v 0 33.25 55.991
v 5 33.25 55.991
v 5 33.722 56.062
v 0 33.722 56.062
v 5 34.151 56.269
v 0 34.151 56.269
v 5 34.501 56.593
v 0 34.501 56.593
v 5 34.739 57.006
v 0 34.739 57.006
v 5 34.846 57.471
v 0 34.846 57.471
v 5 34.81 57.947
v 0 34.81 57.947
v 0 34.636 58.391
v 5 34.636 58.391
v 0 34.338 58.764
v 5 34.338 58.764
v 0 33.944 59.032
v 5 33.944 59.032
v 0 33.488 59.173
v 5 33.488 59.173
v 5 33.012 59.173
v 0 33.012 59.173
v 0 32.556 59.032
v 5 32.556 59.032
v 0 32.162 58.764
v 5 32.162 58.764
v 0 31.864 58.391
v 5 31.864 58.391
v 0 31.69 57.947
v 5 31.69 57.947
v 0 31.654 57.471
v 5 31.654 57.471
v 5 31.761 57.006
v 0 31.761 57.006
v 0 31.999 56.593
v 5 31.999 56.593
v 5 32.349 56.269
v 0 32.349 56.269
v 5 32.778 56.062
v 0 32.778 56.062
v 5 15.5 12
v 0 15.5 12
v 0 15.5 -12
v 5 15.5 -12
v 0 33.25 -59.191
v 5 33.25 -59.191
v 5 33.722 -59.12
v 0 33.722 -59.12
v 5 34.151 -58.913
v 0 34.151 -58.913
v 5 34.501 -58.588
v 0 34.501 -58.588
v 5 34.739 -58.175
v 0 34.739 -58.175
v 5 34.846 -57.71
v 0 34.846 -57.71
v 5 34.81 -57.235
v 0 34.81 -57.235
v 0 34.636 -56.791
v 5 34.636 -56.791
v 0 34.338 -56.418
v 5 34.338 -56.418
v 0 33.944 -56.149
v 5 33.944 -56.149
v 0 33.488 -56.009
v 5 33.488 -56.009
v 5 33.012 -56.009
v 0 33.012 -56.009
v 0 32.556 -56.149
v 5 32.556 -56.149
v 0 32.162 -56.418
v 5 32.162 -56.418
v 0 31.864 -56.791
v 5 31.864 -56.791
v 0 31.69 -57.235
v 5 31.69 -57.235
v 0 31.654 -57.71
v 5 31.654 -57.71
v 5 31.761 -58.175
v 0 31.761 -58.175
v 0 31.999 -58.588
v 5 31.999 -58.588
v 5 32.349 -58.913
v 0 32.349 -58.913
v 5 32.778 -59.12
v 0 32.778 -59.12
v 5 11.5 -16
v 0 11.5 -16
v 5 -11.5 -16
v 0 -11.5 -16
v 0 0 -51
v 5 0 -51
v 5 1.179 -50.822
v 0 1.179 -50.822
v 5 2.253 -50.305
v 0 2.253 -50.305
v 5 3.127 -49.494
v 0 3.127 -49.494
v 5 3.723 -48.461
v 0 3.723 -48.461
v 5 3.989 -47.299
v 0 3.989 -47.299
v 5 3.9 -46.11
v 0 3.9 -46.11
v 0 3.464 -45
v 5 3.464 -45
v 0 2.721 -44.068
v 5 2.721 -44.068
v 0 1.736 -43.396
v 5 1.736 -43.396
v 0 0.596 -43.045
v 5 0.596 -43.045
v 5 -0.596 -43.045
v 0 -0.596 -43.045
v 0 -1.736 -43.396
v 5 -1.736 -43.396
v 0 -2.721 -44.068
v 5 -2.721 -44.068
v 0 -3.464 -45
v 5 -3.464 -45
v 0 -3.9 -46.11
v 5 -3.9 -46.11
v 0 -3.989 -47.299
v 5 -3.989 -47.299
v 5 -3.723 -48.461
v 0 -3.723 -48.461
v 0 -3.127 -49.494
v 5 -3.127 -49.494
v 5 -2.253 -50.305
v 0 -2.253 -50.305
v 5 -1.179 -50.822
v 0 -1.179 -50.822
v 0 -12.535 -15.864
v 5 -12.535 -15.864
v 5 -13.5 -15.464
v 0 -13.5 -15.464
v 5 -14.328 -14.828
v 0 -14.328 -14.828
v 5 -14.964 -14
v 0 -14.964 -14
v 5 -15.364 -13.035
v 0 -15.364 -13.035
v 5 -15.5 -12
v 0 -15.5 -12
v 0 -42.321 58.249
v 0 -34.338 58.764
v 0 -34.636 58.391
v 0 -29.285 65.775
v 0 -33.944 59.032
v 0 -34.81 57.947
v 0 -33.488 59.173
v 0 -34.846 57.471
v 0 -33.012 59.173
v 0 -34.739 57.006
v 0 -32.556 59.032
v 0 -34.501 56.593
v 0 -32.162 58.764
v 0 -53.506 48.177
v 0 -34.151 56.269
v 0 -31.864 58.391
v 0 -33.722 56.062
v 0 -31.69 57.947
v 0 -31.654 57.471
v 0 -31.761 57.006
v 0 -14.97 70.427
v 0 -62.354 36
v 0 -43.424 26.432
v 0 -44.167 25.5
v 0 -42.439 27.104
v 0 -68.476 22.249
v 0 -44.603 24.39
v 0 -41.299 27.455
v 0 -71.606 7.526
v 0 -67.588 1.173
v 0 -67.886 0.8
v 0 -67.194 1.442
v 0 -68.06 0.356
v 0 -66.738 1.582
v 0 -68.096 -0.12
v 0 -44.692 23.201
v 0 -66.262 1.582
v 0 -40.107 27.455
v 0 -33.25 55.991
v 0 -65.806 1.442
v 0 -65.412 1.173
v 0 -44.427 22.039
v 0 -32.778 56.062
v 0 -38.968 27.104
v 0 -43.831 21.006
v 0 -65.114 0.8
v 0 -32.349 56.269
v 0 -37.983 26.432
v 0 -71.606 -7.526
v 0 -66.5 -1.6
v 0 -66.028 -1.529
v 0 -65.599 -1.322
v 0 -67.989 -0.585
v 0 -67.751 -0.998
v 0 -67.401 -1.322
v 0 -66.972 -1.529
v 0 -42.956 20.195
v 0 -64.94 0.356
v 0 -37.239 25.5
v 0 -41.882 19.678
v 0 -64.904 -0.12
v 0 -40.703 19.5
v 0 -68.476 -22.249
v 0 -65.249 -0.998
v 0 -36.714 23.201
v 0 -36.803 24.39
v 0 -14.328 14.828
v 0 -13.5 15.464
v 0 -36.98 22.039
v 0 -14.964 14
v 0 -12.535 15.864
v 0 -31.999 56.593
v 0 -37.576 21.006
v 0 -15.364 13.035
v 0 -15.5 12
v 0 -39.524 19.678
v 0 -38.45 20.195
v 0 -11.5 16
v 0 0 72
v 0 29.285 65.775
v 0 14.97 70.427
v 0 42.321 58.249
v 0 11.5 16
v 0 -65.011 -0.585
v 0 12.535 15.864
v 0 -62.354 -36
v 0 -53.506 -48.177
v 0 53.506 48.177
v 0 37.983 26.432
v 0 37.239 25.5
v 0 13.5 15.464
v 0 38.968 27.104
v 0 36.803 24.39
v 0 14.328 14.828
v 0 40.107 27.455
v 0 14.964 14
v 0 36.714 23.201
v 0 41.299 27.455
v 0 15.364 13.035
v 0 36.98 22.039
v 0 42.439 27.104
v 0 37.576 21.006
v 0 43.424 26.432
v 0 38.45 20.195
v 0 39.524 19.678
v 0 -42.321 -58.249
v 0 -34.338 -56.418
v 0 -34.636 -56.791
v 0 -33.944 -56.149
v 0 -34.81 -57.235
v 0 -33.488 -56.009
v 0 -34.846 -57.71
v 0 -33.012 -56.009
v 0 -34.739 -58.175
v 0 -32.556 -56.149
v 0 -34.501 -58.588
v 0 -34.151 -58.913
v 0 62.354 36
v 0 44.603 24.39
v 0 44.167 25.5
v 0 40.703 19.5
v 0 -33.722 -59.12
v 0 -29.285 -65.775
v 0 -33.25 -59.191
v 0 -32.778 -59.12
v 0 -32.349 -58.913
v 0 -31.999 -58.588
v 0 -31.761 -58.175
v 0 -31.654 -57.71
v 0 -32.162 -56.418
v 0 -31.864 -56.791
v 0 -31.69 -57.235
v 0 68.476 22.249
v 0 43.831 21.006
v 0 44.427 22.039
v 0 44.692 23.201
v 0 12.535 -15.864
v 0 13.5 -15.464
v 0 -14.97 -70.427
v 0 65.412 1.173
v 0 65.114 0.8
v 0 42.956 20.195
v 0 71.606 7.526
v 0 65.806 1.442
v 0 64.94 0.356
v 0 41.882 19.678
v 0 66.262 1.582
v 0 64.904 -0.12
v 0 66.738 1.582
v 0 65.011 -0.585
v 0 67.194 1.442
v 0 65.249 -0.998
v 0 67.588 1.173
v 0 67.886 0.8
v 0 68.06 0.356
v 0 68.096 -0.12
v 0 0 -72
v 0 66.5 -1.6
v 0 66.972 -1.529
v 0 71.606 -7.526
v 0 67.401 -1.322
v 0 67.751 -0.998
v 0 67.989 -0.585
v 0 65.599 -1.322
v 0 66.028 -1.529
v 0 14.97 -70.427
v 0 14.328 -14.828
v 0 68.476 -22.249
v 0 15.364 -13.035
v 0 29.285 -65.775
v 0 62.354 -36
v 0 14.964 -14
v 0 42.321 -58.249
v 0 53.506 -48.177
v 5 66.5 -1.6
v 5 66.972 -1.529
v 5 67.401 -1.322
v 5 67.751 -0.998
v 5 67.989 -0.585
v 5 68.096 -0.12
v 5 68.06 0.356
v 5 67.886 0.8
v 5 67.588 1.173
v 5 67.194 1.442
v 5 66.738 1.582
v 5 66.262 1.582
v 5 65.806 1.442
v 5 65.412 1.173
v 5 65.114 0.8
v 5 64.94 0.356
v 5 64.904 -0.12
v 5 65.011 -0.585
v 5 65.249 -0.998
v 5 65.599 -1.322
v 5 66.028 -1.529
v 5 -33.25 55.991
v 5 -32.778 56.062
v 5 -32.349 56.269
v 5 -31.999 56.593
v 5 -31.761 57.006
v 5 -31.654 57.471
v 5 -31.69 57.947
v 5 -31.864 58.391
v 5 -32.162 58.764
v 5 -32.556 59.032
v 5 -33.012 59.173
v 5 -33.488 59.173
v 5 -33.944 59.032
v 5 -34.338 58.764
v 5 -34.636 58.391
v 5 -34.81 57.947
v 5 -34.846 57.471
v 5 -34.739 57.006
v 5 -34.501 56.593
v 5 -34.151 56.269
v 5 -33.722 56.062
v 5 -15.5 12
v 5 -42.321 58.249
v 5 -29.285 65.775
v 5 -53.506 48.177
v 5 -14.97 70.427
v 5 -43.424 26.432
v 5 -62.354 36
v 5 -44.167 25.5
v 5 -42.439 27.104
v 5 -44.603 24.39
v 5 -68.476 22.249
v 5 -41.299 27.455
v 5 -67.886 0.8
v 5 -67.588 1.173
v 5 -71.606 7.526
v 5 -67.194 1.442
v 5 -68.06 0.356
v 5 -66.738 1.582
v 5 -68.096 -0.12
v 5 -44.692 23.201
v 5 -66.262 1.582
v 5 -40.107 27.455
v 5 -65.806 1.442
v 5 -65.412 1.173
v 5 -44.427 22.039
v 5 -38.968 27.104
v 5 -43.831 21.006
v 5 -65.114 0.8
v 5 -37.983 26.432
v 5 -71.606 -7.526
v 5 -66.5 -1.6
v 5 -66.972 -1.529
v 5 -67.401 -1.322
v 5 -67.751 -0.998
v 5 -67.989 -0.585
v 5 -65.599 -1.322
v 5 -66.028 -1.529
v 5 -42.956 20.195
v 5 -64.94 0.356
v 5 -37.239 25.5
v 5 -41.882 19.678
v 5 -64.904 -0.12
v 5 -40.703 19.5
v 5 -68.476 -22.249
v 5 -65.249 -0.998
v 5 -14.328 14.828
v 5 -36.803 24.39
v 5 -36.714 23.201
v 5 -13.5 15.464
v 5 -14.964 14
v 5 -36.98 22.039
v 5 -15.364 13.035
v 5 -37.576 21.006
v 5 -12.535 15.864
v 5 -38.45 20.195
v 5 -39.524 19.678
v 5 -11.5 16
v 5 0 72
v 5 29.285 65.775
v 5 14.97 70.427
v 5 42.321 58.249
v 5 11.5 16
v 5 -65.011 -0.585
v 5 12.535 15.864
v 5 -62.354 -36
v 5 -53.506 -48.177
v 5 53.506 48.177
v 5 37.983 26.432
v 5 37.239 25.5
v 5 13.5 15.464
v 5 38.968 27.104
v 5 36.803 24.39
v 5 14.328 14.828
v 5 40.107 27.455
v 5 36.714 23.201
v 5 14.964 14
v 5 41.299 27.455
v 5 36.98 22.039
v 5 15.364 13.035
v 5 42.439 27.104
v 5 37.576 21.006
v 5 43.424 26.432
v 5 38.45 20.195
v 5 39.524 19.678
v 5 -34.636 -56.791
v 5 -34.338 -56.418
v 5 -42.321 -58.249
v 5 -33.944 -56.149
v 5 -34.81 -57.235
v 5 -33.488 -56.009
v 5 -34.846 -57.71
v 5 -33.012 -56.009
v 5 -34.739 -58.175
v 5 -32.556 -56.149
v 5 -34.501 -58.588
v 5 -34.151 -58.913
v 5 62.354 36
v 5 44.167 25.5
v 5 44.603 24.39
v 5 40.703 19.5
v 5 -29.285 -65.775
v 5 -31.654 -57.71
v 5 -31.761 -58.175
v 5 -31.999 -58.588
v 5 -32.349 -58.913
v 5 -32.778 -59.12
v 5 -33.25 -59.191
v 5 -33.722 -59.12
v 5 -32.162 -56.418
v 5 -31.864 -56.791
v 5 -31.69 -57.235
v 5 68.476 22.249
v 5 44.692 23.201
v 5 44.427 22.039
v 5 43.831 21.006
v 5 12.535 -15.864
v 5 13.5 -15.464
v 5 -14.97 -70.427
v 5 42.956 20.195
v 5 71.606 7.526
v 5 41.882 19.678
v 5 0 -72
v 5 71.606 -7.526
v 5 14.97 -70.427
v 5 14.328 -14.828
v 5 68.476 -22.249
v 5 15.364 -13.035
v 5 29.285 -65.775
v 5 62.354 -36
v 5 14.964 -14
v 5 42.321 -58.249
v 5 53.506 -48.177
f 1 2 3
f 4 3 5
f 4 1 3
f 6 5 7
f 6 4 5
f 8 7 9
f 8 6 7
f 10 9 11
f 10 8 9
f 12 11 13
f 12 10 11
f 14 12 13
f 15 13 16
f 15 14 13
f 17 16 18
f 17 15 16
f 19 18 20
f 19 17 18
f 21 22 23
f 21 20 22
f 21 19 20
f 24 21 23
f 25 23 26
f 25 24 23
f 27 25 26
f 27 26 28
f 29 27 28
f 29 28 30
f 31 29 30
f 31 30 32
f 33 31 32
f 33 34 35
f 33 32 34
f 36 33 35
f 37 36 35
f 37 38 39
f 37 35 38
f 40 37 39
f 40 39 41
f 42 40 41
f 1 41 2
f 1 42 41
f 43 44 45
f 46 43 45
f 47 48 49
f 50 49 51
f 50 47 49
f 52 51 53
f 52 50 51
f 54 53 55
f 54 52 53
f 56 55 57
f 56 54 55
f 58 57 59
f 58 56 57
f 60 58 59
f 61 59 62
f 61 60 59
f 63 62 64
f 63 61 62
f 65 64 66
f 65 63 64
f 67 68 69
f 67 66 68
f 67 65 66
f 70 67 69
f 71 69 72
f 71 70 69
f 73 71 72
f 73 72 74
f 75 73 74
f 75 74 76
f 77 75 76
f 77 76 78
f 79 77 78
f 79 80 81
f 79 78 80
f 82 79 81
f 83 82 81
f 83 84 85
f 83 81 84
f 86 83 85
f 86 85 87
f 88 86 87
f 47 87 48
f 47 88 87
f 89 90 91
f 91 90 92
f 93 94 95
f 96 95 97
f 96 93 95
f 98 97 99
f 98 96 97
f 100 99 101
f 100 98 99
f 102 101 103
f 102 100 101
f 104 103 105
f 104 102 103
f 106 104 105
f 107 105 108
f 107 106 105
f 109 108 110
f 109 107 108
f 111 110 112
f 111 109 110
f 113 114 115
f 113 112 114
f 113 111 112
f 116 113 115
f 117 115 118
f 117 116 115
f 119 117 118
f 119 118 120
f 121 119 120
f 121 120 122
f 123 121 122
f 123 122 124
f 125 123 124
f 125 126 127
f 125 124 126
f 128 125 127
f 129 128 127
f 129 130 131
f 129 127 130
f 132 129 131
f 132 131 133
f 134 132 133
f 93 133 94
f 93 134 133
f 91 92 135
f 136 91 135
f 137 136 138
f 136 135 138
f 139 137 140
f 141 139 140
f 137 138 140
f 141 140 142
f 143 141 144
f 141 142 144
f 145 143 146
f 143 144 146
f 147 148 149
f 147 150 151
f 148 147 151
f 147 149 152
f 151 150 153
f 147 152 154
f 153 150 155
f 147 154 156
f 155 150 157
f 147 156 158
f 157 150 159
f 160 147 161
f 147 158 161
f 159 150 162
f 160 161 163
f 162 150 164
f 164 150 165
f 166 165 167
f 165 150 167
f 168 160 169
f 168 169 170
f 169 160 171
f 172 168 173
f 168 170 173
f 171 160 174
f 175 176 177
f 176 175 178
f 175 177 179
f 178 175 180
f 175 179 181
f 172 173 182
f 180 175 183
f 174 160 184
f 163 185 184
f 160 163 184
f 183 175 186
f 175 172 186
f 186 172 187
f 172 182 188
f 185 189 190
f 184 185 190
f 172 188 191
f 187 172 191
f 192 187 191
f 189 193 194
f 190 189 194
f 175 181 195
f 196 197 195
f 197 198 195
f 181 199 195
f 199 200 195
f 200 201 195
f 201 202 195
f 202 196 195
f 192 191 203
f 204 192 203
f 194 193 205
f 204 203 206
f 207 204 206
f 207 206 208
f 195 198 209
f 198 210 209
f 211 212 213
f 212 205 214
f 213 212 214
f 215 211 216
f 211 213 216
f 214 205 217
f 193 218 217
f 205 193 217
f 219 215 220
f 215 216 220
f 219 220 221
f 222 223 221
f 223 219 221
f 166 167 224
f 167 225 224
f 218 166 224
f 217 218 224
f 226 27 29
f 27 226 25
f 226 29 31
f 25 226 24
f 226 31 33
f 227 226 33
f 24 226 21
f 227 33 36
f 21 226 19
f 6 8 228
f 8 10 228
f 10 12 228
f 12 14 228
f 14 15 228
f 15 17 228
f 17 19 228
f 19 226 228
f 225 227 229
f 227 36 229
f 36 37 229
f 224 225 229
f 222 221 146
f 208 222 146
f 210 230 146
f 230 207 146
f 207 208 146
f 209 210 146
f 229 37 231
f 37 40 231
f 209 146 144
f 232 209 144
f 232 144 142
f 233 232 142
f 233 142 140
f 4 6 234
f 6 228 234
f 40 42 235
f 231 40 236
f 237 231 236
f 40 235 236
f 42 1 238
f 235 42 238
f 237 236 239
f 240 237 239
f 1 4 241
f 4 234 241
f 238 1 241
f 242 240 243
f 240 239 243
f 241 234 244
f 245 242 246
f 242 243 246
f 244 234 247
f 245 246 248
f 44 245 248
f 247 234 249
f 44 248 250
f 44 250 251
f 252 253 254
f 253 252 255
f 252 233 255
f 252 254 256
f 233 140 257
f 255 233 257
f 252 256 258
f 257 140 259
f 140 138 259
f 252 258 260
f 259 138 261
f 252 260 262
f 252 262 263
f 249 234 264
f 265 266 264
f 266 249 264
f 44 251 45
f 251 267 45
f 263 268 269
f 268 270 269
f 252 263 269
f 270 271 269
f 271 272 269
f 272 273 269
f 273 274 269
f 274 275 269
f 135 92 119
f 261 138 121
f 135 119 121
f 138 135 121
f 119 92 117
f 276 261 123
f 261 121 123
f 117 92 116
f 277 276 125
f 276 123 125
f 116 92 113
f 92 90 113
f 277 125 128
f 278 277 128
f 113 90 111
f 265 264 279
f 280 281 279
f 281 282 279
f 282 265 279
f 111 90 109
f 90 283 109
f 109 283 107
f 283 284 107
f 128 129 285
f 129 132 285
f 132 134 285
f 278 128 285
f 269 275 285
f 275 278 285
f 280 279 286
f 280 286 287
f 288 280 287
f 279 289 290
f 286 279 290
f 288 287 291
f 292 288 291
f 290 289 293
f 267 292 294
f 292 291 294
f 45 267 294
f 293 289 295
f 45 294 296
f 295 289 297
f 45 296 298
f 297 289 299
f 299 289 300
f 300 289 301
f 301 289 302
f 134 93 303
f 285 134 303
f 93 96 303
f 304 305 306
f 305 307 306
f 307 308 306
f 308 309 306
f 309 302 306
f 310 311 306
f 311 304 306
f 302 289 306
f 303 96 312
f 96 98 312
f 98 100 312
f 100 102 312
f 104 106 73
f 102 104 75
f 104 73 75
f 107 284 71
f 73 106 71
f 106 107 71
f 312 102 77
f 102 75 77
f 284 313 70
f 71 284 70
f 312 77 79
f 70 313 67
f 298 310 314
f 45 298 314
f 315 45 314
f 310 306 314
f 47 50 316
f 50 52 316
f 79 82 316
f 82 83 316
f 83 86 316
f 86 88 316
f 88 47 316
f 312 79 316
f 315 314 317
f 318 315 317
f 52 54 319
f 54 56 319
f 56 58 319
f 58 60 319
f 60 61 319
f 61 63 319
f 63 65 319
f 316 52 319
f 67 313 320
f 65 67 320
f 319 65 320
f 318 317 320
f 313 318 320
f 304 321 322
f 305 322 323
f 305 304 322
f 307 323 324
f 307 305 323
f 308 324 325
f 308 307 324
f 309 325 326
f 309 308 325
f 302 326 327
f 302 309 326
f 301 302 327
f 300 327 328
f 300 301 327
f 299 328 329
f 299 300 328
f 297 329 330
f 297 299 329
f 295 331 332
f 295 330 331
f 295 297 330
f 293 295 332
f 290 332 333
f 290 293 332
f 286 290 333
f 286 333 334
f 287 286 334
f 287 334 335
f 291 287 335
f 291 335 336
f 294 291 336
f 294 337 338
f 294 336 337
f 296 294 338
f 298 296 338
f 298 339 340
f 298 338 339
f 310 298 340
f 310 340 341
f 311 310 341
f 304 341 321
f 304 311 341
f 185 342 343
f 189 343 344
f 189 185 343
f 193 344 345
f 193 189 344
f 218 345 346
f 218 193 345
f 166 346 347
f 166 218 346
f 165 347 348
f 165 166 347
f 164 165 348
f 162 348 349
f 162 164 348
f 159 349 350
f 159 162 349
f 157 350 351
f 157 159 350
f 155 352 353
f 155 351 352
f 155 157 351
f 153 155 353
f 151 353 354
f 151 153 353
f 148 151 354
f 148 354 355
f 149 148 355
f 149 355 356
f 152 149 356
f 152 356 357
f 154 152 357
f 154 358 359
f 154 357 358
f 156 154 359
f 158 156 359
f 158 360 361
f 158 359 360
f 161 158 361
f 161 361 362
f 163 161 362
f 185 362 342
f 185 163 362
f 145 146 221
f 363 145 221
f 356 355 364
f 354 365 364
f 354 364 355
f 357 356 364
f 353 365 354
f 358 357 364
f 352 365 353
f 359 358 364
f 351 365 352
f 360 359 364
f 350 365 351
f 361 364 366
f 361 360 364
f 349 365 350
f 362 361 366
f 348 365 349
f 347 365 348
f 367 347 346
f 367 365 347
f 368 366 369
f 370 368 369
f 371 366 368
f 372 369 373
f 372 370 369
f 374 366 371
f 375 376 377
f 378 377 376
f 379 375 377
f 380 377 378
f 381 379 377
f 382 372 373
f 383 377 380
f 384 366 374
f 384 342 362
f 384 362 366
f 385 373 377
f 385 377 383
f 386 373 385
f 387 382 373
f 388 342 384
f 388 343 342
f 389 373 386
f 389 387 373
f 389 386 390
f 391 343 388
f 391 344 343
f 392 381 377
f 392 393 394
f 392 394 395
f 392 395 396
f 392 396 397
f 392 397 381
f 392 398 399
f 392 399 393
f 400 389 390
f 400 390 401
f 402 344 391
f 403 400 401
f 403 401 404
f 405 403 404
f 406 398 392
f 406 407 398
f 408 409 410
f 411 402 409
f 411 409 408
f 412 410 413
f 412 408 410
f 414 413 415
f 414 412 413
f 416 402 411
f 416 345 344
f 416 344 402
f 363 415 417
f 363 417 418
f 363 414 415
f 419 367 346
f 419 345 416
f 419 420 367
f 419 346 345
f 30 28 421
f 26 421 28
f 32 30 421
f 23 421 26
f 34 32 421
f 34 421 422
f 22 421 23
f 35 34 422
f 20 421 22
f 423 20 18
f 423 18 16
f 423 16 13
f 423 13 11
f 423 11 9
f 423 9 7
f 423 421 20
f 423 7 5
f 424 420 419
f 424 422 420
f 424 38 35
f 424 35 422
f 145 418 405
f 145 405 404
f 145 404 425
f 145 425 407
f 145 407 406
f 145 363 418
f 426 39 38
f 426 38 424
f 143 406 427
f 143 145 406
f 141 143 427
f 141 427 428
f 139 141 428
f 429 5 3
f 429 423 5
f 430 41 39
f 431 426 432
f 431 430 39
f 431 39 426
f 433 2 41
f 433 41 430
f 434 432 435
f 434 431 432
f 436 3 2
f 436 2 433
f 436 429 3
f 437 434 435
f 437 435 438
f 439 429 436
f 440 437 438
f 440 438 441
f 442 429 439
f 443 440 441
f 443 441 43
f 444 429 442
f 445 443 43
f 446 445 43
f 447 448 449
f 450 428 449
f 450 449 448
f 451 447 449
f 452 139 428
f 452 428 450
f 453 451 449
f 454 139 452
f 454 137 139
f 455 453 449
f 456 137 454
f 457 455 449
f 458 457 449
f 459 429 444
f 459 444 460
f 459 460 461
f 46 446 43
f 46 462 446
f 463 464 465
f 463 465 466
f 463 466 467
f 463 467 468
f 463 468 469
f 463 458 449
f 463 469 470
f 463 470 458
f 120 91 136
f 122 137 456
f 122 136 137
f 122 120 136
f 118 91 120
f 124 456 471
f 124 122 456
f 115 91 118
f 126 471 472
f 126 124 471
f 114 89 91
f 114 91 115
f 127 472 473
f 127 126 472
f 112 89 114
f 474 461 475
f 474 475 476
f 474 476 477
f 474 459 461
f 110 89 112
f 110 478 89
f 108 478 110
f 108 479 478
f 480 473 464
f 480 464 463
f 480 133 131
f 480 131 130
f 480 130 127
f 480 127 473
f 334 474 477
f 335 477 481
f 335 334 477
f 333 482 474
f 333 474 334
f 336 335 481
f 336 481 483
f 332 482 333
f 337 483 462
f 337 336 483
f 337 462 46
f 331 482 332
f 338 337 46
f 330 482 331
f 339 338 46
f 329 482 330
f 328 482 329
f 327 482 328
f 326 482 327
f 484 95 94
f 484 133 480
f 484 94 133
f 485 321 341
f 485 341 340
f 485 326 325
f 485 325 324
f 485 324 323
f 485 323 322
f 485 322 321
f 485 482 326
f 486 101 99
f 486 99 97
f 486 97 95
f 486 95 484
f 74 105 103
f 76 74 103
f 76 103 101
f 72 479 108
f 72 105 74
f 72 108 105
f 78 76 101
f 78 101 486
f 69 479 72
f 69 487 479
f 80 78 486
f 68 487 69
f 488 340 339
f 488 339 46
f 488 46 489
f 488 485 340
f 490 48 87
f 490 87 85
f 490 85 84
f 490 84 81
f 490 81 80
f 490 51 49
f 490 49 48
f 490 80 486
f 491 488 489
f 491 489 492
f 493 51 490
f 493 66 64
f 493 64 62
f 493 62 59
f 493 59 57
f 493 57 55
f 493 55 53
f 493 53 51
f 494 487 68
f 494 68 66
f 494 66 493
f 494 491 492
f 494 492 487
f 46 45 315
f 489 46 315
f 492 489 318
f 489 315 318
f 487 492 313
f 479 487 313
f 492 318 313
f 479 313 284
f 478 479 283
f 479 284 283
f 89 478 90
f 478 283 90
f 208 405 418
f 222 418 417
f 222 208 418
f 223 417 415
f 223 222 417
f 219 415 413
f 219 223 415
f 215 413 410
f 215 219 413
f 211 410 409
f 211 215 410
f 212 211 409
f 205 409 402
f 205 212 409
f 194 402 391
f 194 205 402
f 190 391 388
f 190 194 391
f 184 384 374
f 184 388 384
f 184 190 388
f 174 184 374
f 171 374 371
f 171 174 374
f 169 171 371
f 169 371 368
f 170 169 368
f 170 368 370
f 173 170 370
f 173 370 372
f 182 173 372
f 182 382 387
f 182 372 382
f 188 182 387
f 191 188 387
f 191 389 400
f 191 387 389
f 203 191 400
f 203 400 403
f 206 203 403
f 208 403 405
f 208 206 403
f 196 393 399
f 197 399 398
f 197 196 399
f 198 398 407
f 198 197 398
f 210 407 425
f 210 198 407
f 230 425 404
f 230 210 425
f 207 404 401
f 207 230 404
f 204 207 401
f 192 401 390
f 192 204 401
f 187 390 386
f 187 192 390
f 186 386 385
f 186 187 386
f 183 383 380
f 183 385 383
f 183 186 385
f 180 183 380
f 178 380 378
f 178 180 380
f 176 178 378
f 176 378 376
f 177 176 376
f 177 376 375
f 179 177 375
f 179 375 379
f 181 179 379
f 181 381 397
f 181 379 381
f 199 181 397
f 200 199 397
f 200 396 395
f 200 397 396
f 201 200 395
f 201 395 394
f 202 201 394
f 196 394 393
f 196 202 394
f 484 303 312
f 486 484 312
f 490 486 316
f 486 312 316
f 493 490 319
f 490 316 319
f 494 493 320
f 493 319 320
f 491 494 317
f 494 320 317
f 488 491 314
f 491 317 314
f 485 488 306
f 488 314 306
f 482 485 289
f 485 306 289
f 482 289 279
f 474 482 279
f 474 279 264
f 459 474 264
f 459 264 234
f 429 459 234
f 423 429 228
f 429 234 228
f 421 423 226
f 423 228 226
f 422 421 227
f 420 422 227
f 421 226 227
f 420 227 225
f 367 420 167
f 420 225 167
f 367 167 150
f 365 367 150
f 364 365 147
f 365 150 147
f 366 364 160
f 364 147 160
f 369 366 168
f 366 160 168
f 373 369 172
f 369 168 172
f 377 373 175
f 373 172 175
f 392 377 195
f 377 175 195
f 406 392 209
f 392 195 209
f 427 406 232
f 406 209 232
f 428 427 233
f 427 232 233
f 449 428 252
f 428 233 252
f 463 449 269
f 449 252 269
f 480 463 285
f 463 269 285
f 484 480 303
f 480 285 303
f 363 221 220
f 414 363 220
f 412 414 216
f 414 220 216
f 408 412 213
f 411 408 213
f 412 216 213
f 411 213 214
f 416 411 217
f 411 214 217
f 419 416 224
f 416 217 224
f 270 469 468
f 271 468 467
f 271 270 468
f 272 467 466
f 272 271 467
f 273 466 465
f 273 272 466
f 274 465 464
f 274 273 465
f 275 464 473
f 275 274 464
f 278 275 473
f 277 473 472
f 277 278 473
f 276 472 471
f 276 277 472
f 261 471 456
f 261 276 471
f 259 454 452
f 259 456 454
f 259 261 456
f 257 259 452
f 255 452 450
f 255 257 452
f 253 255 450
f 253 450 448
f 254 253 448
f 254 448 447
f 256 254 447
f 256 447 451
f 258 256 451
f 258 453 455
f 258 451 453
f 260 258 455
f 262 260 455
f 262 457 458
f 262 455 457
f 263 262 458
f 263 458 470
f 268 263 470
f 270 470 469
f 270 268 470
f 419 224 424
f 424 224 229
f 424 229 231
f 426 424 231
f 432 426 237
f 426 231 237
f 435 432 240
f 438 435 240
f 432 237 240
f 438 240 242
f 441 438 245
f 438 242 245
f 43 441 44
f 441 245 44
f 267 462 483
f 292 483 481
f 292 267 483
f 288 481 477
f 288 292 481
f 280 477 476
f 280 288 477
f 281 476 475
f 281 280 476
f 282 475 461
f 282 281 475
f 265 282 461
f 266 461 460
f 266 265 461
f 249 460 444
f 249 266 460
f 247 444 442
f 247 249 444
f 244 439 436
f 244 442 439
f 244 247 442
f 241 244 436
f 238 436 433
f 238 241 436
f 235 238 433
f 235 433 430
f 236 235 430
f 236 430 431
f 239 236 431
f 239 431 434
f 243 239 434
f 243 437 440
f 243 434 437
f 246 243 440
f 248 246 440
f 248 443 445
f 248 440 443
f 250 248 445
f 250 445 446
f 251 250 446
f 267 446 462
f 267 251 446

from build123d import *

# Parameters (mm, degrees)
SKETCH4_R           = 72
BOSS_EXTRUDE3_DEPTH = 5
SKETCH3_R           = 4
CUT_EXTRUDE6_DEPTH  = 102.946064171
SKETCH2_R           = 1.6
CUT_EXTRUDE1_DEPTH  = 102.946064171
GOPRO_DEPTH         = 102.946064171


with BuildPart() as part:
    # Sketch4 → Boss-Extrude3 (new body)
    with BuildSketch(Plane(origin=(0, 0, 0), x_dir=(0, 0, -1), z_dir=(1, 0, 0))):
        Circle(SKETCH4_R)
    extrude(amount=BOSS_EXTRUDE3_DEPTH)

    # Sketch3 → Cut-Extrude6 (cut, through all)
    with BuildSketch(Plane(origin=(0, 0, 0), x_dir=(0, 0, -1), z_dir=(1, 0, 0))):
        with Locations((47, 0)):
            Circle(SKETCH3_R)
        with Locations((-23.5, -40.703193978)):
            Circle(SKETCH3_R)
        with Locations((-23.5, 40.703193978)):
            Circle(SKETCH3_R)
    extrude(amount=CUT_EXTRUDE6_DEPTH, mode=Mode.SUBTRACT)

    # Sketch2 → Cut-Extrude1 (cut, through all)
    with BuildSketch(Plane(origin=(0, 0, 0), x_dir=(0, 0, -1), z_dir=(1, 0, 0))):
        with Locations((0, 66.5)):
            Circle(SKETCH2_R)
        with Locations((57.590689352, 33.25)):
            Circle(SKETCH2_R)
        with Locations((57.590689352, -33.25)):
            Circle(SKETCH2_R)
        with Locations((0, -66.5)):
            Circle(SKETCH2_R)
        with Locations((-57.590689352, -33.25)):
            Circle(SKETCH2_R)
        with Locations((-57.590689352, 33.25)):
            Circle(SKETCH2_R)
    extrude(amount=CUT_EXTRUDE1_DEPTH, mode=Mode.SUBTRACT)

    # Sketch1 → gopro (cut, through all)
    with BuildSketch(Plane(origin=(0, 0, 0), x_dir=(0, 0, -1), z_dir=(1, 0, 0))):
        with BuildLine():
            Line((-12, 15.5), (12, 15.5))
            ThreePointArc((12, 15.5), (14.828427125, 14.328427125), (16, 11.5))
            Line((16, 11.5), (16, -11.5))
            ThreePointArc((16, -11.5), (14.828427125, -14.328427125), (12, -15.5))
            Line((12, -15.5), (-12, -15.5))
            ThreePointArc((-12, -15.5), (-14.828427125, -14.328427125), (-16, -11.5))
            Line((-16, -11.5), (-16, 11.5))
            ThreePointArc((-16, 11.5), (-14.828427125, 14.328427125), (-12, 15.5))
        make_face()
    extrude(amount=GOPRO_DEPTH, mode=Mode.SUBTRACT)


solid = part.part
